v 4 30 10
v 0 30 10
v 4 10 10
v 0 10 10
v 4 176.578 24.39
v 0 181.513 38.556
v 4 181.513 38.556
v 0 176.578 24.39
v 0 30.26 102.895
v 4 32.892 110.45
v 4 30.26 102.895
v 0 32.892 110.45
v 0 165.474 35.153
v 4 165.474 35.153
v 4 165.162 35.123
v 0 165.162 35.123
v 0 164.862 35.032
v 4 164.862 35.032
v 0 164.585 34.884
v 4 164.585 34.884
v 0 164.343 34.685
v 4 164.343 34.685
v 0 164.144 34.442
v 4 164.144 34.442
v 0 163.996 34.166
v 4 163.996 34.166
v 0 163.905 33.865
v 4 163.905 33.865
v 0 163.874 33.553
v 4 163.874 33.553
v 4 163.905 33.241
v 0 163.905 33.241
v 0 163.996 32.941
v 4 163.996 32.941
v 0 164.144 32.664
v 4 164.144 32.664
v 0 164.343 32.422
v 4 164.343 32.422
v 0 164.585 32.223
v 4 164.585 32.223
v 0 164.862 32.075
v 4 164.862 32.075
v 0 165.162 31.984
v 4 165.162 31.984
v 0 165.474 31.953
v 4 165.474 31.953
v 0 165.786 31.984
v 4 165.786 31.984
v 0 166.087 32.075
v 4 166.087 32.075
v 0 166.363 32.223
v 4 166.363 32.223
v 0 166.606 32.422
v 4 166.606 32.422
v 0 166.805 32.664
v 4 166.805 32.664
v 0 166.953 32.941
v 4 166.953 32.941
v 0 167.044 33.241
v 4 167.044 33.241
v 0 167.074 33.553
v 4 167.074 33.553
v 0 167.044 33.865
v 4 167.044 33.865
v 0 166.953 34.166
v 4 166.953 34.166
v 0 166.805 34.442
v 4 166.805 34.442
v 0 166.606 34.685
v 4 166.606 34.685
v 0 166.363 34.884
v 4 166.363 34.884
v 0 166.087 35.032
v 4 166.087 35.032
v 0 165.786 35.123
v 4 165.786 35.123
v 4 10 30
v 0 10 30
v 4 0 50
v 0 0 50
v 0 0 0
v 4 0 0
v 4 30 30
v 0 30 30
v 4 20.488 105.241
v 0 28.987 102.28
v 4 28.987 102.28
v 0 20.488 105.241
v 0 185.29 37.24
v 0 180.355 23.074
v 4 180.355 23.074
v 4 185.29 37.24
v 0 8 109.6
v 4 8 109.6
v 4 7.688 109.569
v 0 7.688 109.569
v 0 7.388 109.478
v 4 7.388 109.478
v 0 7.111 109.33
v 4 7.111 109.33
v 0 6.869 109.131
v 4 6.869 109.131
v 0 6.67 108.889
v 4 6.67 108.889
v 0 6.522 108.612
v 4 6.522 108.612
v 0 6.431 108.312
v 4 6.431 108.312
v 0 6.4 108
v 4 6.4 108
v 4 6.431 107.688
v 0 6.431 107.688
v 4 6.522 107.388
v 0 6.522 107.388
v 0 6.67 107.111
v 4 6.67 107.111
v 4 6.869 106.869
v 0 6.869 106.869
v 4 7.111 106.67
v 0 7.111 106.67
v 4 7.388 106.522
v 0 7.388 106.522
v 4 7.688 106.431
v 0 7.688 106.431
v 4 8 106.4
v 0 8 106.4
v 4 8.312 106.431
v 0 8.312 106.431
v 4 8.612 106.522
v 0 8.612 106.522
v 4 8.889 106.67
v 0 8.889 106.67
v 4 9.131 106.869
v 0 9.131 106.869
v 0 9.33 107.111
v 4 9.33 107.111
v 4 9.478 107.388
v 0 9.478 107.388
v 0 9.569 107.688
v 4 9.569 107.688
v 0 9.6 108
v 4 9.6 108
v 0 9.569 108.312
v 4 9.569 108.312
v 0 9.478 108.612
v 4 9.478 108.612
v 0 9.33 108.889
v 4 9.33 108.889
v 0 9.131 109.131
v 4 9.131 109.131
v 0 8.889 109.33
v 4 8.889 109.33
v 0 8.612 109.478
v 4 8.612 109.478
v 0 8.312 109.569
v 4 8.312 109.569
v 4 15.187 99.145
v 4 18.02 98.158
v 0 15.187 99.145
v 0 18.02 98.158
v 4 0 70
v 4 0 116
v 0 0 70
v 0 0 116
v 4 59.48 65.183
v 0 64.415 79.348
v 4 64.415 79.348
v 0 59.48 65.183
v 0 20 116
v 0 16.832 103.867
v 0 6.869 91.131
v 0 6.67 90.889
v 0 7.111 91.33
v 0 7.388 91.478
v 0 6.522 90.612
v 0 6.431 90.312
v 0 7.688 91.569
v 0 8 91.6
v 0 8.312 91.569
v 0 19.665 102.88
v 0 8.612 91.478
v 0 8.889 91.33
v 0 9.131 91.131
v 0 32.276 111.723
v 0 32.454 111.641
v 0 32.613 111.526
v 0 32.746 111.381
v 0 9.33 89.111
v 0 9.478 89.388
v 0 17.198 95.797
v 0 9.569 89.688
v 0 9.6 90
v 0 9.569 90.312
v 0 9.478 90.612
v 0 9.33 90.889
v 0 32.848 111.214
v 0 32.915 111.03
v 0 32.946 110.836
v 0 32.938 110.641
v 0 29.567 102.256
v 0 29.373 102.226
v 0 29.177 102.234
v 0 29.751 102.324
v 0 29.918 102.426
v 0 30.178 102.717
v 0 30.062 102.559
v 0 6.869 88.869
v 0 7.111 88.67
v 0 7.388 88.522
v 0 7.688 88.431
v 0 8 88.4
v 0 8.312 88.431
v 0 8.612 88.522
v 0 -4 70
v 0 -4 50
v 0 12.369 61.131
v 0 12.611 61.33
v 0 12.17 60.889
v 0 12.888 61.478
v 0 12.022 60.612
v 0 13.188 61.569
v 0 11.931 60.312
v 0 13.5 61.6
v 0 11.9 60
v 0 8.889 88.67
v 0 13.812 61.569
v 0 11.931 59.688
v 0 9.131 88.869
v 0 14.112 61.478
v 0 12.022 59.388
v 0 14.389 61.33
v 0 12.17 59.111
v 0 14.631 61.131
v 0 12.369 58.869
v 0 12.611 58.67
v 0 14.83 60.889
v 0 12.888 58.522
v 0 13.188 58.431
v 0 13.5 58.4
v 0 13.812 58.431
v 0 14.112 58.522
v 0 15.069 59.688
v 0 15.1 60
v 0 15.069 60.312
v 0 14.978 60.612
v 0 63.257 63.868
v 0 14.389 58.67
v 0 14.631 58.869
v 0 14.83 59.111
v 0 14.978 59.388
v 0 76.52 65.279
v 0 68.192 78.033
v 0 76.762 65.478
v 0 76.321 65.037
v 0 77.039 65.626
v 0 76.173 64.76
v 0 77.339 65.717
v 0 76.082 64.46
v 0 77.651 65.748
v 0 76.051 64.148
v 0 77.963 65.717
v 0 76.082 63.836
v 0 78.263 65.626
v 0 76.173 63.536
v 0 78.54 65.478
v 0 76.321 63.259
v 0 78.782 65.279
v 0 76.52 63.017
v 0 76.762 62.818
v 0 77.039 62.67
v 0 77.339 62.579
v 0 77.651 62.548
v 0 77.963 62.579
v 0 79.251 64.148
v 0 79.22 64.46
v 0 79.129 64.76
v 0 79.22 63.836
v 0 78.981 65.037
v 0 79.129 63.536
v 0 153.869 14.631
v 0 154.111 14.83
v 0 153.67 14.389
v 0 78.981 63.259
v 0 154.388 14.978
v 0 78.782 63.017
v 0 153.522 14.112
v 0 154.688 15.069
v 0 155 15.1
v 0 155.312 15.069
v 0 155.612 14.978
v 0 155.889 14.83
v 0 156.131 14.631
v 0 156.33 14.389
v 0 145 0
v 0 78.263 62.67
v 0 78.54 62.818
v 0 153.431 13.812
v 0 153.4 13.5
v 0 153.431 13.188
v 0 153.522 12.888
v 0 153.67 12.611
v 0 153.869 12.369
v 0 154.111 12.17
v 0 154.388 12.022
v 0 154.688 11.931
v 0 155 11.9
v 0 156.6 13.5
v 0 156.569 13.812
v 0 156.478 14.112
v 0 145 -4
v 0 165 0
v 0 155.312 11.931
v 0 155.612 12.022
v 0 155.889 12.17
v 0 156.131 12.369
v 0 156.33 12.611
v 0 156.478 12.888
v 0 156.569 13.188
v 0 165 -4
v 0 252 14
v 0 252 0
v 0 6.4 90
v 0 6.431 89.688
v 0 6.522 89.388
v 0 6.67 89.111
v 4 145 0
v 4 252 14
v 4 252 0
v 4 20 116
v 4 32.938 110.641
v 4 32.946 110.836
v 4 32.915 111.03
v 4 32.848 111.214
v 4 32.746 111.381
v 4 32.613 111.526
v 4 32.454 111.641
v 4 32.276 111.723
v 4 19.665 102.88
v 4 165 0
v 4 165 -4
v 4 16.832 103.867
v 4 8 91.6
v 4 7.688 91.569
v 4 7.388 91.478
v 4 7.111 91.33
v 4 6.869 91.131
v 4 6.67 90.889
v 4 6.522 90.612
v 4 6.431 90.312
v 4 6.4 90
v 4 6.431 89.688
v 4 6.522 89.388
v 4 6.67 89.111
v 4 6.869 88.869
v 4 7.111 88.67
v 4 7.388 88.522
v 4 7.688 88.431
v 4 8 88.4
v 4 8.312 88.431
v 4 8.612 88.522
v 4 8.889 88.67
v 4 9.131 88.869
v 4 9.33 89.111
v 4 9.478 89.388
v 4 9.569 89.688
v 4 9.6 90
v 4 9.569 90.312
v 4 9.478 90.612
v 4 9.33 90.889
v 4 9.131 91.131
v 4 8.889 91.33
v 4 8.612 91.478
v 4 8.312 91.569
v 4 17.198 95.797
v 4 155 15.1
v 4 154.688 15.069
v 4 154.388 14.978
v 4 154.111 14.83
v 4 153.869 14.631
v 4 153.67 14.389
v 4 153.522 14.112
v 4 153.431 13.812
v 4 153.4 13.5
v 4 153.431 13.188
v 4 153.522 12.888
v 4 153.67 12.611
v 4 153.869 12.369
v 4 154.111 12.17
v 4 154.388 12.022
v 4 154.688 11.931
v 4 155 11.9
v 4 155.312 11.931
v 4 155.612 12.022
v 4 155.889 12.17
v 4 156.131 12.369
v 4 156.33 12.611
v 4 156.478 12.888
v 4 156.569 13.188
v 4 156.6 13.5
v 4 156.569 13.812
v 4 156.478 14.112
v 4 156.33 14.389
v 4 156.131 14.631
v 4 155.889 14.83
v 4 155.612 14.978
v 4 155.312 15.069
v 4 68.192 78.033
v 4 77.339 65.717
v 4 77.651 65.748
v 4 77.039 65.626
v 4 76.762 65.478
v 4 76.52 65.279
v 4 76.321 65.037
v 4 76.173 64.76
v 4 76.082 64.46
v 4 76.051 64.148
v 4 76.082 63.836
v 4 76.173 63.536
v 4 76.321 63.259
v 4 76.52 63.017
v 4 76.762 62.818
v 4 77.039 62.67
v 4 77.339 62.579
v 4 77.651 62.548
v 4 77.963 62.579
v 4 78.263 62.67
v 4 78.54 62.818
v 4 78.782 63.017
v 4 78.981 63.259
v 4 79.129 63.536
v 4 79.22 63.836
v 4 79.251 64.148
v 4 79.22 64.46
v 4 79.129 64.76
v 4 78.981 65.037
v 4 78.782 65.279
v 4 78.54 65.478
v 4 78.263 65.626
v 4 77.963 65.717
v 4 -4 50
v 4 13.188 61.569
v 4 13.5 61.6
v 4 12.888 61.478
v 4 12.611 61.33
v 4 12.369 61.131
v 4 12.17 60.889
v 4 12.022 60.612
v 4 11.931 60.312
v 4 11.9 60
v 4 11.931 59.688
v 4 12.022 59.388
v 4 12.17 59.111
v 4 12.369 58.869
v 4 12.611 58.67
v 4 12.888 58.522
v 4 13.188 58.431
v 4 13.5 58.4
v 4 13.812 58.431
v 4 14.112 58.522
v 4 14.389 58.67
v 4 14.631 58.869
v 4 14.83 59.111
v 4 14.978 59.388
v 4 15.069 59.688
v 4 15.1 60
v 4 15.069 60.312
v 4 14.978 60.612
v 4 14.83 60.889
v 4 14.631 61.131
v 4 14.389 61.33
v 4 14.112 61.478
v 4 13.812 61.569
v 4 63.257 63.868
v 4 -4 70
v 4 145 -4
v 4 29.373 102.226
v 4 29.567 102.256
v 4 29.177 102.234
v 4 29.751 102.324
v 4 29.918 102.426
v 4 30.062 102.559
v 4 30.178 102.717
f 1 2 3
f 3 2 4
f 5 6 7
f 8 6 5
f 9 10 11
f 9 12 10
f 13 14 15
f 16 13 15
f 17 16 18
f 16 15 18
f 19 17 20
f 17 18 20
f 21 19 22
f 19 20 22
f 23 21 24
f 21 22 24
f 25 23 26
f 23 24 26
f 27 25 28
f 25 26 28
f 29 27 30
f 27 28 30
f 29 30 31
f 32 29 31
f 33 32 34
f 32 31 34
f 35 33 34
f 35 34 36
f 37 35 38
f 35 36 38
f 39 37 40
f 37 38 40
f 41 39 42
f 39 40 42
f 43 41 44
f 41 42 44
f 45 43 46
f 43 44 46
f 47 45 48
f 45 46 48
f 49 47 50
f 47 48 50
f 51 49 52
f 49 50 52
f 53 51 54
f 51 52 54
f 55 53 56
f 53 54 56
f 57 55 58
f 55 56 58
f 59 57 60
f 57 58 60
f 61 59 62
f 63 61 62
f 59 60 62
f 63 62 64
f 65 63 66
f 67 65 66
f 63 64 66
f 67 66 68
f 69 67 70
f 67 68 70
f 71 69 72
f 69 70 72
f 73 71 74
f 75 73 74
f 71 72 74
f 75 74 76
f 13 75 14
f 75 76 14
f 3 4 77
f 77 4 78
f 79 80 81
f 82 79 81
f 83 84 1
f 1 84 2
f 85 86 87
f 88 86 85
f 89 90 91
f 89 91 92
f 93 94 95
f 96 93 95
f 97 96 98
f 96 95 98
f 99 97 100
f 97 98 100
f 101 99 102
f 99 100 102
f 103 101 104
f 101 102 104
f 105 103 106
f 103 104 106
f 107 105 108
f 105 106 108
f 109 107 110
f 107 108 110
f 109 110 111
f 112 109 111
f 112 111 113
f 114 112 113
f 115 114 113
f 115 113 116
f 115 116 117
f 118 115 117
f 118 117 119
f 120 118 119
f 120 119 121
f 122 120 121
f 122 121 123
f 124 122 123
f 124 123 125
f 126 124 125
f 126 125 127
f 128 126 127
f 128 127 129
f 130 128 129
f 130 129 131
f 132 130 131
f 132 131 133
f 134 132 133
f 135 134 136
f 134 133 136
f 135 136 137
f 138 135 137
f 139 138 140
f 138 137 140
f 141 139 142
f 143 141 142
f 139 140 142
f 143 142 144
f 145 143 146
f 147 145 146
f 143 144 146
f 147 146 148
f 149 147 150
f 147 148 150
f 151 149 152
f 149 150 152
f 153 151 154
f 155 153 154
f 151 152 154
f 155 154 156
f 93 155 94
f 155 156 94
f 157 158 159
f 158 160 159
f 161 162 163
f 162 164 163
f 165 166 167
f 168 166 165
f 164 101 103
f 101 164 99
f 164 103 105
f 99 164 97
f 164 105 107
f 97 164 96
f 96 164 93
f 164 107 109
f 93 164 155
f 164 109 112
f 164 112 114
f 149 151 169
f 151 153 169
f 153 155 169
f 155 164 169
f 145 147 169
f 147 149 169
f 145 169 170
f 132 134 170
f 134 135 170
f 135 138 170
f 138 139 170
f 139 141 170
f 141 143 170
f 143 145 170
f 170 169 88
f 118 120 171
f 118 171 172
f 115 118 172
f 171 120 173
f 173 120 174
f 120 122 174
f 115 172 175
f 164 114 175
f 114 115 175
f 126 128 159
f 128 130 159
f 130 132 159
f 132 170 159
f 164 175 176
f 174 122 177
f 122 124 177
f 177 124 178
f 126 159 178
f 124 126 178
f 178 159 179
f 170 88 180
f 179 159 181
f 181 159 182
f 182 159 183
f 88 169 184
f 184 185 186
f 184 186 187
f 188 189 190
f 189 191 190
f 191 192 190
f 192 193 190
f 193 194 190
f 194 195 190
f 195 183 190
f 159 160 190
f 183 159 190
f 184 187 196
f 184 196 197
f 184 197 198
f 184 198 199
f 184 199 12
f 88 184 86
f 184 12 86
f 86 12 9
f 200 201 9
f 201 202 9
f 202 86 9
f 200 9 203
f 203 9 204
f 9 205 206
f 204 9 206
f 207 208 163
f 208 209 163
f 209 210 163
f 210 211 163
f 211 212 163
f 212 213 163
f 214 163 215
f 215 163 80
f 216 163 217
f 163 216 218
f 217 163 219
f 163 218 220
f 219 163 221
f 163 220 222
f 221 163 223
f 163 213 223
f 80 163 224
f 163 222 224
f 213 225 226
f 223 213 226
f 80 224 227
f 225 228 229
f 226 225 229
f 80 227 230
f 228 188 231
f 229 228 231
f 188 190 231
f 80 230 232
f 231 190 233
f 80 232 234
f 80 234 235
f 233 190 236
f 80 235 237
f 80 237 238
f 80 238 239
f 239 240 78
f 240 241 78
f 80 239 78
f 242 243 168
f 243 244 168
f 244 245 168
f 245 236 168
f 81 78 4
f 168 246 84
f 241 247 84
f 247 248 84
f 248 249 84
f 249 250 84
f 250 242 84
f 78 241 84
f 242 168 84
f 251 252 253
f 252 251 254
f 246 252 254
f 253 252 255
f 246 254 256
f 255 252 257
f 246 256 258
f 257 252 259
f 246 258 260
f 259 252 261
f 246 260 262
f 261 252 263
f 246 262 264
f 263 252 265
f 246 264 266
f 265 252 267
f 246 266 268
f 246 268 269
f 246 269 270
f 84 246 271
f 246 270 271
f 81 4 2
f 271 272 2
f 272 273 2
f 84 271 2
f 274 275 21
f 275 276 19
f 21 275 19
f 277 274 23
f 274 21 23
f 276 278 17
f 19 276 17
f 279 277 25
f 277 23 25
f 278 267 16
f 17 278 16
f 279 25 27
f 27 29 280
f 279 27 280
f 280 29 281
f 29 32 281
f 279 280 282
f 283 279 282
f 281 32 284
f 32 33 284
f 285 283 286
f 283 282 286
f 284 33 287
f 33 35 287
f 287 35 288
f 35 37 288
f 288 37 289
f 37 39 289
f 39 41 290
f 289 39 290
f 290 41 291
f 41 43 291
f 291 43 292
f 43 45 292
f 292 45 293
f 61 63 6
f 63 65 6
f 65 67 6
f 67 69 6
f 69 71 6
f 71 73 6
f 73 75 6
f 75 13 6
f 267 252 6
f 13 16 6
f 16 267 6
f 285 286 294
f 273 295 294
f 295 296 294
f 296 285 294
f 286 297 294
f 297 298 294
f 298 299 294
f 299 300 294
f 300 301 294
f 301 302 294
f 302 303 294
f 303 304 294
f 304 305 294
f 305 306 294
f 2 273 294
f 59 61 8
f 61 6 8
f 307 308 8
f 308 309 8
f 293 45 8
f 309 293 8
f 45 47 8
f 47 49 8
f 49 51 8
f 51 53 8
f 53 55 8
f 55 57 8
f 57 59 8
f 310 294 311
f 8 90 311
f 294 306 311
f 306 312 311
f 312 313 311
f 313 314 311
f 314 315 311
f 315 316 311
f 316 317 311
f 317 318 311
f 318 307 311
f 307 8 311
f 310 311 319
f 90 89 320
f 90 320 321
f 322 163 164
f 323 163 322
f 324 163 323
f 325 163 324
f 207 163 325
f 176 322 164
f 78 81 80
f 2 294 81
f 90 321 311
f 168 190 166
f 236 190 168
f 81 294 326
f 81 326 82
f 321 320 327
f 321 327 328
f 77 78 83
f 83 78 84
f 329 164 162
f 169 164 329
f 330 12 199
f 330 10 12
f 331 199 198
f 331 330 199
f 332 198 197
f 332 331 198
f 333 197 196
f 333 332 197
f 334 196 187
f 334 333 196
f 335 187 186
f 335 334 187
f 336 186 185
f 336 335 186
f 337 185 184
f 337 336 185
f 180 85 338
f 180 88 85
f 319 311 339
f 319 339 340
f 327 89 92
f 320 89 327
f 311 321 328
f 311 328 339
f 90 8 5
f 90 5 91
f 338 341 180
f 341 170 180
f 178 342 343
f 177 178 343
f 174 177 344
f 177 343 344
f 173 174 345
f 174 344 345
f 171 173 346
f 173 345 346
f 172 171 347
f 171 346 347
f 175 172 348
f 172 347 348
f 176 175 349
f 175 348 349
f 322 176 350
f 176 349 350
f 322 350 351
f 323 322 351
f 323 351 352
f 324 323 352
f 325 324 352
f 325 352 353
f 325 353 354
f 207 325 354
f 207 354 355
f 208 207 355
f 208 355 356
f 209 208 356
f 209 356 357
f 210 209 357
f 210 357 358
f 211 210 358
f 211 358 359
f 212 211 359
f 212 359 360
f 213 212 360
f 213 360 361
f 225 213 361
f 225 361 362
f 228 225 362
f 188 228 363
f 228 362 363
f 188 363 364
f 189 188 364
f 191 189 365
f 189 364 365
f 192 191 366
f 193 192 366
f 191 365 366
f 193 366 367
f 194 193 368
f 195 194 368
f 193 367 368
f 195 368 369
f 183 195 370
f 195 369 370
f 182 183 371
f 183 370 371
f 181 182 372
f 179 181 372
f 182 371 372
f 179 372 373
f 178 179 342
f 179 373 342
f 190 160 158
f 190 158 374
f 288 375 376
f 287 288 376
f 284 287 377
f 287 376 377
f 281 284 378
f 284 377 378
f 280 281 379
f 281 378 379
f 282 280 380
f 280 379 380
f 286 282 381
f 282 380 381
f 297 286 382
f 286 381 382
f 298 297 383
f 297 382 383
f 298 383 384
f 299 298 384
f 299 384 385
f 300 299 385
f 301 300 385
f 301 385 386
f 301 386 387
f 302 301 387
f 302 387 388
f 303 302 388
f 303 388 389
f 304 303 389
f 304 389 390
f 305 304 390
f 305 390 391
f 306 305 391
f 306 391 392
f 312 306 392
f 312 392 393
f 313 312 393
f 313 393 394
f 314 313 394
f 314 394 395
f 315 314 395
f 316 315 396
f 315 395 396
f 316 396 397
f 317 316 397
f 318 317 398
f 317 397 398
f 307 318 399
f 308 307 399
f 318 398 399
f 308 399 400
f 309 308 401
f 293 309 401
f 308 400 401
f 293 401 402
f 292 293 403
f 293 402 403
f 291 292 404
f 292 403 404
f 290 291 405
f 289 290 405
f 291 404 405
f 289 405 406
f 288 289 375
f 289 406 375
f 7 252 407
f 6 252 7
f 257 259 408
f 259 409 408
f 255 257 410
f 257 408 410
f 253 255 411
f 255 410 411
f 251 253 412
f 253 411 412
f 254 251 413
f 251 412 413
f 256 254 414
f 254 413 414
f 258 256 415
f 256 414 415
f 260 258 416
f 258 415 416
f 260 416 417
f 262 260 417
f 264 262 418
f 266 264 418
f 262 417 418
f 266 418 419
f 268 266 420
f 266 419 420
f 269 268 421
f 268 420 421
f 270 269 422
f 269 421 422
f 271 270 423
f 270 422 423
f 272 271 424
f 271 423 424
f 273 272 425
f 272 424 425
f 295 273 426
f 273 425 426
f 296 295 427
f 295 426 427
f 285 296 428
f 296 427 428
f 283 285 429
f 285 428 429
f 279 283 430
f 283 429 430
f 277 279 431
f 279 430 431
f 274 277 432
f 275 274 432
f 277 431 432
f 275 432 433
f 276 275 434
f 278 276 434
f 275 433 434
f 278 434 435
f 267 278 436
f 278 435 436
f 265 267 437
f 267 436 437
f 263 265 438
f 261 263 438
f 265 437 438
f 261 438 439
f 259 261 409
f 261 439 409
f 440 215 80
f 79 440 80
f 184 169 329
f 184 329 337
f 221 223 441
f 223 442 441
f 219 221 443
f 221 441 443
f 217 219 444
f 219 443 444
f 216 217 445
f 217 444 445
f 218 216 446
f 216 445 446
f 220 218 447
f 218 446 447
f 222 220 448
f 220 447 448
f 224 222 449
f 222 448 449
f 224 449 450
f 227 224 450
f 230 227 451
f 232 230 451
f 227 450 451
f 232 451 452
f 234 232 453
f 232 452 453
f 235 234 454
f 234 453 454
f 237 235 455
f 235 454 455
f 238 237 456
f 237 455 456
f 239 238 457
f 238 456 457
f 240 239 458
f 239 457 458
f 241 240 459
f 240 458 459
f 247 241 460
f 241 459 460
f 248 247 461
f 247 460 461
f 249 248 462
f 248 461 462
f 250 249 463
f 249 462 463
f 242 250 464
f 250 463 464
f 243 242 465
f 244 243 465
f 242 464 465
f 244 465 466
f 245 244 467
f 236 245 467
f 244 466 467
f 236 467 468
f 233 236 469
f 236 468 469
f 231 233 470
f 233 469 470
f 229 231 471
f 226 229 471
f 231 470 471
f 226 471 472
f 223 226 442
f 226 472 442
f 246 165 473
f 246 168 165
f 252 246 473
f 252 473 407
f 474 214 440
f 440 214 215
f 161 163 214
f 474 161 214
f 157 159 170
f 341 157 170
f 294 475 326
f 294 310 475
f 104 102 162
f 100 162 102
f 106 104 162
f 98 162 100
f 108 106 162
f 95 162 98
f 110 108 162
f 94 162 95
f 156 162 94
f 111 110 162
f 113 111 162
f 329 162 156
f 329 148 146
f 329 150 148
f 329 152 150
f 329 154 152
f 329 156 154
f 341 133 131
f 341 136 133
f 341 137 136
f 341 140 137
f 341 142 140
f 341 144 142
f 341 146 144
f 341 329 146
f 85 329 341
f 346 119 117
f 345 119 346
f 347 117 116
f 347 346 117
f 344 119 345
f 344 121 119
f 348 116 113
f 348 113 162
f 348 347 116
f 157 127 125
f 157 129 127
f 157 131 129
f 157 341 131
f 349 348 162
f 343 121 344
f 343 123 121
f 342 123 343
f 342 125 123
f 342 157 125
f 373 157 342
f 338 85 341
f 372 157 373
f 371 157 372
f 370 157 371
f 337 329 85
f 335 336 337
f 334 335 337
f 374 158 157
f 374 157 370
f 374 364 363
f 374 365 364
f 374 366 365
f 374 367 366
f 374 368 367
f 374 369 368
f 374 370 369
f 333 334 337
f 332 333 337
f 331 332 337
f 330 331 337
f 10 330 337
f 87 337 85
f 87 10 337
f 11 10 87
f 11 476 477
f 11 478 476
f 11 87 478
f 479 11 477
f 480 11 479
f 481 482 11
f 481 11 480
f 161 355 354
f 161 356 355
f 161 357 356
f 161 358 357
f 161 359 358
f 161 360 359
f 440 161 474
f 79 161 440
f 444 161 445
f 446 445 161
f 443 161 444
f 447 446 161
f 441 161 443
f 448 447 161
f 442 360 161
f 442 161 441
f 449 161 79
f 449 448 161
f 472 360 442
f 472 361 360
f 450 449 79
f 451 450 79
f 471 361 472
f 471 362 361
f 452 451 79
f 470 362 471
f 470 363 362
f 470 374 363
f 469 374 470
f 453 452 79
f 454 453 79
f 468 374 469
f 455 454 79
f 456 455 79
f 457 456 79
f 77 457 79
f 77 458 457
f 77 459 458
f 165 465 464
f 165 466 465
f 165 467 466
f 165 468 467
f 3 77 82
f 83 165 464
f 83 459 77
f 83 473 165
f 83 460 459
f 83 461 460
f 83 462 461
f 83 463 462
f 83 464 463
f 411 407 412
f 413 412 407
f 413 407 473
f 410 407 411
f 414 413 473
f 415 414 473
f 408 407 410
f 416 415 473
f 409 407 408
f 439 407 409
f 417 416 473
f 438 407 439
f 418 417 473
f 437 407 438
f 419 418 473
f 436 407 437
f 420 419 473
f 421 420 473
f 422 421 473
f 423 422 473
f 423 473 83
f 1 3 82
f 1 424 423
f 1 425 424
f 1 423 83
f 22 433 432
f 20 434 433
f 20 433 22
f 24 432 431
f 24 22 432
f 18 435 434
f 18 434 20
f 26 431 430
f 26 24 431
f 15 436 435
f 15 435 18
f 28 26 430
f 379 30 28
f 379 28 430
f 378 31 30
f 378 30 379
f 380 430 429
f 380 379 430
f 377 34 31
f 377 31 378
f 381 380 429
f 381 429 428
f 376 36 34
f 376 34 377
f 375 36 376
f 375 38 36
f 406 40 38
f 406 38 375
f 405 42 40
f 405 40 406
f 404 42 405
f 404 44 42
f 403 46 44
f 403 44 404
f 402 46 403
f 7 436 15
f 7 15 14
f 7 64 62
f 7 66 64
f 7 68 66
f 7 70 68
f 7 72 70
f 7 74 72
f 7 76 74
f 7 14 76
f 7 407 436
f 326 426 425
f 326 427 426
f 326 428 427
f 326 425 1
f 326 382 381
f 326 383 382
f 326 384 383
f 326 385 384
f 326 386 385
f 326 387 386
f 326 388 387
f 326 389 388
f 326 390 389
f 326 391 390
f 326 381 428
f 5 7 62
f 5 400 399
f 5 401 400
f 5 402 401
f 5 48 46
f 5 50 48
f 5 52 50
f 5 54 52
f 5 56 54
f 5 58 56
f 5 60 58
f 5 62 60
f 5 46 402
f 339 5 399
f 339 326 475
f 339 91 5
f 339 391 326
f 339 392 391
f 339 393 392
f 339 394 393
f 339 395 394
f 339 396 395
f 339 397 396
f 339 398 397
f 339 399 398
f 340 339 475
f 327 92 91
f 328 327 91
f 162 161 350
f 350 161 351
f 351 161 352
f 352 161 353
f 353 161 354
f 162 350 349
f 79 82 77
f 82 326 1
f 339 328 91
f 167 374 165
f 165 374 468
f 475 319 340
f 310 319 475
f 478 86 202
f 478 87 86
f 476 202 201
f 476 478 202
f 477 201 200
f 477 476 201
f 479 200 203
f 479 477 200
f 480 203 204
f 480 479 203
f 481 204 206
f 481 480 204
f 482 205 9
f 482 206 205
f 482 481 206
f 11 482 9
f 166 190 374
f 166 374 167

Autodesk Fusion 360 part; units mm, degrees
sketch "スケッチ1" plane through (0, 0, 0) normal (1, 0, 0) x (0, 0, -1)
  line L0 (-116, 0) -> (-116, 20)
  line L1 (-116, 20) -> (-111.3943, 33.2207)
  line L2 (-111.3943, 33.2207) -> (-101.951, 29.931)
  line L3 (-101.951, 29.931) -> (-105.2407, 20.4876)
  line L4 (-105.2407, 20.4876) -> (-95.7973, 17.1978)
  line L5 (-14, 252) -> (0, 252)
  line L6 (-95.7973, 17.1978) -> (-79.3485, 64.4147)
  line L7 (-79.3485, 64.4147) -> (-65.1834, 59.4801)
  line L8 (-65.1834, 59.4801) -> (-63.8675, 63.2574)
  line L9 (-63.8675, 63.2574) -> (-78.0326, 68.1921)
  line L10 (-78.0326, 68.1921) -> (-38.5555, 181.5127)
  line L11 (-38.5555, 181.5127) -> (-24.3904, 176.578)
  line L12 (-24.3904, 176.578) -> (-23.0745, 180.3554)
  line L13 (-23.0745, 180.3554) -> (-37.2396, 185.29)
  line L14 (-37.2396, 185.29) -> (-14, 252)
  line L15 (-116, 0) -> (-70, 0)
  line L16 (-70, 0) -> (-70, -4)
  line L17 (-70, -4) -> (-50, -4)
  line L18 (-50, -4) -> (-50, 0)
  line L19 (-50, 0) -> (0, 0)
  line L20 (0, 252) -> (0, 165)
  line L21 (0, 165) -> (4, 165)
  line L22 (4, 165) -> (4, 145)
  line L23 (4, 145) -> (0, 145)
  line L24 (0, 145) -> (0, 0)
  line L25 (4, 155) -> (-13.5, 155)
  line L26 (-60, -4) -> (-60, 13.5)
  line L27 (-64.1481, 77.6509) -> (-33.5533, 165.4743)
  line L28 (-10, 10) -> (-30, 10)
  line L29 (-30, 10) -> (-30, 30)
  line L30 (-30, 30) -> (-10, 30)
  line L31 (-10, 30) -> (-10, 10)
  line L32 (-108, 8) -> (-90, 8)
  line L33 (-102.8799, 19.6651) -> (-98.1582, 18.0203)
  line L34 (-98.1582, 18.0203) -> (-99.1451, 15.1873)
  line L35 (-99.1451, 15.1873) -> (-103.8668, 16.8321)
  line L36 (-103.8668, 16.8321) -> (-102.8799, 19.6651)
  dimension "d1" = 116
  dimension "d2" = 20
  dimension "d3" = 14
  dimension "d4" = 10
  dimension "d5" = 10
  dimension "d6" = 10
  dimension "d9" = 14
  dimension "d11" = 252
  dimension "d12" = 248.642
  dimension "d13" = 4
  dimension "d14" = 4
  dimension "d15" = 120
  dimension "d16" = 50
  dimension "d17" = 15
  dimension "d18" = 20
  dimension "d19" = 4
  dimension "d20" = 50
  dimension "d21" = 4
  dimension "d22" = 20
  dimension "d23" = 145
  dimension "d24" = 17.5
  dimension "d25" = 17.5
  dimension "d31" = 10
  dimension "d32" = 13.5
  dimension "d33" = 13.5
  dimension "d36" = 10
  dimension "d37" = 20
  dimension "d38" = 20
  dimension "d39" = 10
  dimension "d40" = 8
  dimension "d41" = 8
  dimension "d42" = 18
  dimension "d43" = 5
  dimension "d44" = 3
extrude "押し出し1" add sketch "スケッチ1" along normal blind 4 contours L0 L1 L2 L3 L4 L5 L6 L7 L8 L9 L10 L11 L12 L13 L14 L15 L16 L17 L18 L19 L20 L21 L22 L23 L24 L34 L35 L36
hole "穴1" at (0, 155, 13.5) at (0, 13.5, 60) at (0, 77.6509, 64.1481) at (0, 165.4743, 33.5533) at (0, 8, 108) at (0, 8, 90) direction (1, 0, 0) diameter 3.2 end through all
fillet "フィレット1" radius 1 2 edges at (2, 29.931, 101.951) (2, 33.2207, 111.3943)
